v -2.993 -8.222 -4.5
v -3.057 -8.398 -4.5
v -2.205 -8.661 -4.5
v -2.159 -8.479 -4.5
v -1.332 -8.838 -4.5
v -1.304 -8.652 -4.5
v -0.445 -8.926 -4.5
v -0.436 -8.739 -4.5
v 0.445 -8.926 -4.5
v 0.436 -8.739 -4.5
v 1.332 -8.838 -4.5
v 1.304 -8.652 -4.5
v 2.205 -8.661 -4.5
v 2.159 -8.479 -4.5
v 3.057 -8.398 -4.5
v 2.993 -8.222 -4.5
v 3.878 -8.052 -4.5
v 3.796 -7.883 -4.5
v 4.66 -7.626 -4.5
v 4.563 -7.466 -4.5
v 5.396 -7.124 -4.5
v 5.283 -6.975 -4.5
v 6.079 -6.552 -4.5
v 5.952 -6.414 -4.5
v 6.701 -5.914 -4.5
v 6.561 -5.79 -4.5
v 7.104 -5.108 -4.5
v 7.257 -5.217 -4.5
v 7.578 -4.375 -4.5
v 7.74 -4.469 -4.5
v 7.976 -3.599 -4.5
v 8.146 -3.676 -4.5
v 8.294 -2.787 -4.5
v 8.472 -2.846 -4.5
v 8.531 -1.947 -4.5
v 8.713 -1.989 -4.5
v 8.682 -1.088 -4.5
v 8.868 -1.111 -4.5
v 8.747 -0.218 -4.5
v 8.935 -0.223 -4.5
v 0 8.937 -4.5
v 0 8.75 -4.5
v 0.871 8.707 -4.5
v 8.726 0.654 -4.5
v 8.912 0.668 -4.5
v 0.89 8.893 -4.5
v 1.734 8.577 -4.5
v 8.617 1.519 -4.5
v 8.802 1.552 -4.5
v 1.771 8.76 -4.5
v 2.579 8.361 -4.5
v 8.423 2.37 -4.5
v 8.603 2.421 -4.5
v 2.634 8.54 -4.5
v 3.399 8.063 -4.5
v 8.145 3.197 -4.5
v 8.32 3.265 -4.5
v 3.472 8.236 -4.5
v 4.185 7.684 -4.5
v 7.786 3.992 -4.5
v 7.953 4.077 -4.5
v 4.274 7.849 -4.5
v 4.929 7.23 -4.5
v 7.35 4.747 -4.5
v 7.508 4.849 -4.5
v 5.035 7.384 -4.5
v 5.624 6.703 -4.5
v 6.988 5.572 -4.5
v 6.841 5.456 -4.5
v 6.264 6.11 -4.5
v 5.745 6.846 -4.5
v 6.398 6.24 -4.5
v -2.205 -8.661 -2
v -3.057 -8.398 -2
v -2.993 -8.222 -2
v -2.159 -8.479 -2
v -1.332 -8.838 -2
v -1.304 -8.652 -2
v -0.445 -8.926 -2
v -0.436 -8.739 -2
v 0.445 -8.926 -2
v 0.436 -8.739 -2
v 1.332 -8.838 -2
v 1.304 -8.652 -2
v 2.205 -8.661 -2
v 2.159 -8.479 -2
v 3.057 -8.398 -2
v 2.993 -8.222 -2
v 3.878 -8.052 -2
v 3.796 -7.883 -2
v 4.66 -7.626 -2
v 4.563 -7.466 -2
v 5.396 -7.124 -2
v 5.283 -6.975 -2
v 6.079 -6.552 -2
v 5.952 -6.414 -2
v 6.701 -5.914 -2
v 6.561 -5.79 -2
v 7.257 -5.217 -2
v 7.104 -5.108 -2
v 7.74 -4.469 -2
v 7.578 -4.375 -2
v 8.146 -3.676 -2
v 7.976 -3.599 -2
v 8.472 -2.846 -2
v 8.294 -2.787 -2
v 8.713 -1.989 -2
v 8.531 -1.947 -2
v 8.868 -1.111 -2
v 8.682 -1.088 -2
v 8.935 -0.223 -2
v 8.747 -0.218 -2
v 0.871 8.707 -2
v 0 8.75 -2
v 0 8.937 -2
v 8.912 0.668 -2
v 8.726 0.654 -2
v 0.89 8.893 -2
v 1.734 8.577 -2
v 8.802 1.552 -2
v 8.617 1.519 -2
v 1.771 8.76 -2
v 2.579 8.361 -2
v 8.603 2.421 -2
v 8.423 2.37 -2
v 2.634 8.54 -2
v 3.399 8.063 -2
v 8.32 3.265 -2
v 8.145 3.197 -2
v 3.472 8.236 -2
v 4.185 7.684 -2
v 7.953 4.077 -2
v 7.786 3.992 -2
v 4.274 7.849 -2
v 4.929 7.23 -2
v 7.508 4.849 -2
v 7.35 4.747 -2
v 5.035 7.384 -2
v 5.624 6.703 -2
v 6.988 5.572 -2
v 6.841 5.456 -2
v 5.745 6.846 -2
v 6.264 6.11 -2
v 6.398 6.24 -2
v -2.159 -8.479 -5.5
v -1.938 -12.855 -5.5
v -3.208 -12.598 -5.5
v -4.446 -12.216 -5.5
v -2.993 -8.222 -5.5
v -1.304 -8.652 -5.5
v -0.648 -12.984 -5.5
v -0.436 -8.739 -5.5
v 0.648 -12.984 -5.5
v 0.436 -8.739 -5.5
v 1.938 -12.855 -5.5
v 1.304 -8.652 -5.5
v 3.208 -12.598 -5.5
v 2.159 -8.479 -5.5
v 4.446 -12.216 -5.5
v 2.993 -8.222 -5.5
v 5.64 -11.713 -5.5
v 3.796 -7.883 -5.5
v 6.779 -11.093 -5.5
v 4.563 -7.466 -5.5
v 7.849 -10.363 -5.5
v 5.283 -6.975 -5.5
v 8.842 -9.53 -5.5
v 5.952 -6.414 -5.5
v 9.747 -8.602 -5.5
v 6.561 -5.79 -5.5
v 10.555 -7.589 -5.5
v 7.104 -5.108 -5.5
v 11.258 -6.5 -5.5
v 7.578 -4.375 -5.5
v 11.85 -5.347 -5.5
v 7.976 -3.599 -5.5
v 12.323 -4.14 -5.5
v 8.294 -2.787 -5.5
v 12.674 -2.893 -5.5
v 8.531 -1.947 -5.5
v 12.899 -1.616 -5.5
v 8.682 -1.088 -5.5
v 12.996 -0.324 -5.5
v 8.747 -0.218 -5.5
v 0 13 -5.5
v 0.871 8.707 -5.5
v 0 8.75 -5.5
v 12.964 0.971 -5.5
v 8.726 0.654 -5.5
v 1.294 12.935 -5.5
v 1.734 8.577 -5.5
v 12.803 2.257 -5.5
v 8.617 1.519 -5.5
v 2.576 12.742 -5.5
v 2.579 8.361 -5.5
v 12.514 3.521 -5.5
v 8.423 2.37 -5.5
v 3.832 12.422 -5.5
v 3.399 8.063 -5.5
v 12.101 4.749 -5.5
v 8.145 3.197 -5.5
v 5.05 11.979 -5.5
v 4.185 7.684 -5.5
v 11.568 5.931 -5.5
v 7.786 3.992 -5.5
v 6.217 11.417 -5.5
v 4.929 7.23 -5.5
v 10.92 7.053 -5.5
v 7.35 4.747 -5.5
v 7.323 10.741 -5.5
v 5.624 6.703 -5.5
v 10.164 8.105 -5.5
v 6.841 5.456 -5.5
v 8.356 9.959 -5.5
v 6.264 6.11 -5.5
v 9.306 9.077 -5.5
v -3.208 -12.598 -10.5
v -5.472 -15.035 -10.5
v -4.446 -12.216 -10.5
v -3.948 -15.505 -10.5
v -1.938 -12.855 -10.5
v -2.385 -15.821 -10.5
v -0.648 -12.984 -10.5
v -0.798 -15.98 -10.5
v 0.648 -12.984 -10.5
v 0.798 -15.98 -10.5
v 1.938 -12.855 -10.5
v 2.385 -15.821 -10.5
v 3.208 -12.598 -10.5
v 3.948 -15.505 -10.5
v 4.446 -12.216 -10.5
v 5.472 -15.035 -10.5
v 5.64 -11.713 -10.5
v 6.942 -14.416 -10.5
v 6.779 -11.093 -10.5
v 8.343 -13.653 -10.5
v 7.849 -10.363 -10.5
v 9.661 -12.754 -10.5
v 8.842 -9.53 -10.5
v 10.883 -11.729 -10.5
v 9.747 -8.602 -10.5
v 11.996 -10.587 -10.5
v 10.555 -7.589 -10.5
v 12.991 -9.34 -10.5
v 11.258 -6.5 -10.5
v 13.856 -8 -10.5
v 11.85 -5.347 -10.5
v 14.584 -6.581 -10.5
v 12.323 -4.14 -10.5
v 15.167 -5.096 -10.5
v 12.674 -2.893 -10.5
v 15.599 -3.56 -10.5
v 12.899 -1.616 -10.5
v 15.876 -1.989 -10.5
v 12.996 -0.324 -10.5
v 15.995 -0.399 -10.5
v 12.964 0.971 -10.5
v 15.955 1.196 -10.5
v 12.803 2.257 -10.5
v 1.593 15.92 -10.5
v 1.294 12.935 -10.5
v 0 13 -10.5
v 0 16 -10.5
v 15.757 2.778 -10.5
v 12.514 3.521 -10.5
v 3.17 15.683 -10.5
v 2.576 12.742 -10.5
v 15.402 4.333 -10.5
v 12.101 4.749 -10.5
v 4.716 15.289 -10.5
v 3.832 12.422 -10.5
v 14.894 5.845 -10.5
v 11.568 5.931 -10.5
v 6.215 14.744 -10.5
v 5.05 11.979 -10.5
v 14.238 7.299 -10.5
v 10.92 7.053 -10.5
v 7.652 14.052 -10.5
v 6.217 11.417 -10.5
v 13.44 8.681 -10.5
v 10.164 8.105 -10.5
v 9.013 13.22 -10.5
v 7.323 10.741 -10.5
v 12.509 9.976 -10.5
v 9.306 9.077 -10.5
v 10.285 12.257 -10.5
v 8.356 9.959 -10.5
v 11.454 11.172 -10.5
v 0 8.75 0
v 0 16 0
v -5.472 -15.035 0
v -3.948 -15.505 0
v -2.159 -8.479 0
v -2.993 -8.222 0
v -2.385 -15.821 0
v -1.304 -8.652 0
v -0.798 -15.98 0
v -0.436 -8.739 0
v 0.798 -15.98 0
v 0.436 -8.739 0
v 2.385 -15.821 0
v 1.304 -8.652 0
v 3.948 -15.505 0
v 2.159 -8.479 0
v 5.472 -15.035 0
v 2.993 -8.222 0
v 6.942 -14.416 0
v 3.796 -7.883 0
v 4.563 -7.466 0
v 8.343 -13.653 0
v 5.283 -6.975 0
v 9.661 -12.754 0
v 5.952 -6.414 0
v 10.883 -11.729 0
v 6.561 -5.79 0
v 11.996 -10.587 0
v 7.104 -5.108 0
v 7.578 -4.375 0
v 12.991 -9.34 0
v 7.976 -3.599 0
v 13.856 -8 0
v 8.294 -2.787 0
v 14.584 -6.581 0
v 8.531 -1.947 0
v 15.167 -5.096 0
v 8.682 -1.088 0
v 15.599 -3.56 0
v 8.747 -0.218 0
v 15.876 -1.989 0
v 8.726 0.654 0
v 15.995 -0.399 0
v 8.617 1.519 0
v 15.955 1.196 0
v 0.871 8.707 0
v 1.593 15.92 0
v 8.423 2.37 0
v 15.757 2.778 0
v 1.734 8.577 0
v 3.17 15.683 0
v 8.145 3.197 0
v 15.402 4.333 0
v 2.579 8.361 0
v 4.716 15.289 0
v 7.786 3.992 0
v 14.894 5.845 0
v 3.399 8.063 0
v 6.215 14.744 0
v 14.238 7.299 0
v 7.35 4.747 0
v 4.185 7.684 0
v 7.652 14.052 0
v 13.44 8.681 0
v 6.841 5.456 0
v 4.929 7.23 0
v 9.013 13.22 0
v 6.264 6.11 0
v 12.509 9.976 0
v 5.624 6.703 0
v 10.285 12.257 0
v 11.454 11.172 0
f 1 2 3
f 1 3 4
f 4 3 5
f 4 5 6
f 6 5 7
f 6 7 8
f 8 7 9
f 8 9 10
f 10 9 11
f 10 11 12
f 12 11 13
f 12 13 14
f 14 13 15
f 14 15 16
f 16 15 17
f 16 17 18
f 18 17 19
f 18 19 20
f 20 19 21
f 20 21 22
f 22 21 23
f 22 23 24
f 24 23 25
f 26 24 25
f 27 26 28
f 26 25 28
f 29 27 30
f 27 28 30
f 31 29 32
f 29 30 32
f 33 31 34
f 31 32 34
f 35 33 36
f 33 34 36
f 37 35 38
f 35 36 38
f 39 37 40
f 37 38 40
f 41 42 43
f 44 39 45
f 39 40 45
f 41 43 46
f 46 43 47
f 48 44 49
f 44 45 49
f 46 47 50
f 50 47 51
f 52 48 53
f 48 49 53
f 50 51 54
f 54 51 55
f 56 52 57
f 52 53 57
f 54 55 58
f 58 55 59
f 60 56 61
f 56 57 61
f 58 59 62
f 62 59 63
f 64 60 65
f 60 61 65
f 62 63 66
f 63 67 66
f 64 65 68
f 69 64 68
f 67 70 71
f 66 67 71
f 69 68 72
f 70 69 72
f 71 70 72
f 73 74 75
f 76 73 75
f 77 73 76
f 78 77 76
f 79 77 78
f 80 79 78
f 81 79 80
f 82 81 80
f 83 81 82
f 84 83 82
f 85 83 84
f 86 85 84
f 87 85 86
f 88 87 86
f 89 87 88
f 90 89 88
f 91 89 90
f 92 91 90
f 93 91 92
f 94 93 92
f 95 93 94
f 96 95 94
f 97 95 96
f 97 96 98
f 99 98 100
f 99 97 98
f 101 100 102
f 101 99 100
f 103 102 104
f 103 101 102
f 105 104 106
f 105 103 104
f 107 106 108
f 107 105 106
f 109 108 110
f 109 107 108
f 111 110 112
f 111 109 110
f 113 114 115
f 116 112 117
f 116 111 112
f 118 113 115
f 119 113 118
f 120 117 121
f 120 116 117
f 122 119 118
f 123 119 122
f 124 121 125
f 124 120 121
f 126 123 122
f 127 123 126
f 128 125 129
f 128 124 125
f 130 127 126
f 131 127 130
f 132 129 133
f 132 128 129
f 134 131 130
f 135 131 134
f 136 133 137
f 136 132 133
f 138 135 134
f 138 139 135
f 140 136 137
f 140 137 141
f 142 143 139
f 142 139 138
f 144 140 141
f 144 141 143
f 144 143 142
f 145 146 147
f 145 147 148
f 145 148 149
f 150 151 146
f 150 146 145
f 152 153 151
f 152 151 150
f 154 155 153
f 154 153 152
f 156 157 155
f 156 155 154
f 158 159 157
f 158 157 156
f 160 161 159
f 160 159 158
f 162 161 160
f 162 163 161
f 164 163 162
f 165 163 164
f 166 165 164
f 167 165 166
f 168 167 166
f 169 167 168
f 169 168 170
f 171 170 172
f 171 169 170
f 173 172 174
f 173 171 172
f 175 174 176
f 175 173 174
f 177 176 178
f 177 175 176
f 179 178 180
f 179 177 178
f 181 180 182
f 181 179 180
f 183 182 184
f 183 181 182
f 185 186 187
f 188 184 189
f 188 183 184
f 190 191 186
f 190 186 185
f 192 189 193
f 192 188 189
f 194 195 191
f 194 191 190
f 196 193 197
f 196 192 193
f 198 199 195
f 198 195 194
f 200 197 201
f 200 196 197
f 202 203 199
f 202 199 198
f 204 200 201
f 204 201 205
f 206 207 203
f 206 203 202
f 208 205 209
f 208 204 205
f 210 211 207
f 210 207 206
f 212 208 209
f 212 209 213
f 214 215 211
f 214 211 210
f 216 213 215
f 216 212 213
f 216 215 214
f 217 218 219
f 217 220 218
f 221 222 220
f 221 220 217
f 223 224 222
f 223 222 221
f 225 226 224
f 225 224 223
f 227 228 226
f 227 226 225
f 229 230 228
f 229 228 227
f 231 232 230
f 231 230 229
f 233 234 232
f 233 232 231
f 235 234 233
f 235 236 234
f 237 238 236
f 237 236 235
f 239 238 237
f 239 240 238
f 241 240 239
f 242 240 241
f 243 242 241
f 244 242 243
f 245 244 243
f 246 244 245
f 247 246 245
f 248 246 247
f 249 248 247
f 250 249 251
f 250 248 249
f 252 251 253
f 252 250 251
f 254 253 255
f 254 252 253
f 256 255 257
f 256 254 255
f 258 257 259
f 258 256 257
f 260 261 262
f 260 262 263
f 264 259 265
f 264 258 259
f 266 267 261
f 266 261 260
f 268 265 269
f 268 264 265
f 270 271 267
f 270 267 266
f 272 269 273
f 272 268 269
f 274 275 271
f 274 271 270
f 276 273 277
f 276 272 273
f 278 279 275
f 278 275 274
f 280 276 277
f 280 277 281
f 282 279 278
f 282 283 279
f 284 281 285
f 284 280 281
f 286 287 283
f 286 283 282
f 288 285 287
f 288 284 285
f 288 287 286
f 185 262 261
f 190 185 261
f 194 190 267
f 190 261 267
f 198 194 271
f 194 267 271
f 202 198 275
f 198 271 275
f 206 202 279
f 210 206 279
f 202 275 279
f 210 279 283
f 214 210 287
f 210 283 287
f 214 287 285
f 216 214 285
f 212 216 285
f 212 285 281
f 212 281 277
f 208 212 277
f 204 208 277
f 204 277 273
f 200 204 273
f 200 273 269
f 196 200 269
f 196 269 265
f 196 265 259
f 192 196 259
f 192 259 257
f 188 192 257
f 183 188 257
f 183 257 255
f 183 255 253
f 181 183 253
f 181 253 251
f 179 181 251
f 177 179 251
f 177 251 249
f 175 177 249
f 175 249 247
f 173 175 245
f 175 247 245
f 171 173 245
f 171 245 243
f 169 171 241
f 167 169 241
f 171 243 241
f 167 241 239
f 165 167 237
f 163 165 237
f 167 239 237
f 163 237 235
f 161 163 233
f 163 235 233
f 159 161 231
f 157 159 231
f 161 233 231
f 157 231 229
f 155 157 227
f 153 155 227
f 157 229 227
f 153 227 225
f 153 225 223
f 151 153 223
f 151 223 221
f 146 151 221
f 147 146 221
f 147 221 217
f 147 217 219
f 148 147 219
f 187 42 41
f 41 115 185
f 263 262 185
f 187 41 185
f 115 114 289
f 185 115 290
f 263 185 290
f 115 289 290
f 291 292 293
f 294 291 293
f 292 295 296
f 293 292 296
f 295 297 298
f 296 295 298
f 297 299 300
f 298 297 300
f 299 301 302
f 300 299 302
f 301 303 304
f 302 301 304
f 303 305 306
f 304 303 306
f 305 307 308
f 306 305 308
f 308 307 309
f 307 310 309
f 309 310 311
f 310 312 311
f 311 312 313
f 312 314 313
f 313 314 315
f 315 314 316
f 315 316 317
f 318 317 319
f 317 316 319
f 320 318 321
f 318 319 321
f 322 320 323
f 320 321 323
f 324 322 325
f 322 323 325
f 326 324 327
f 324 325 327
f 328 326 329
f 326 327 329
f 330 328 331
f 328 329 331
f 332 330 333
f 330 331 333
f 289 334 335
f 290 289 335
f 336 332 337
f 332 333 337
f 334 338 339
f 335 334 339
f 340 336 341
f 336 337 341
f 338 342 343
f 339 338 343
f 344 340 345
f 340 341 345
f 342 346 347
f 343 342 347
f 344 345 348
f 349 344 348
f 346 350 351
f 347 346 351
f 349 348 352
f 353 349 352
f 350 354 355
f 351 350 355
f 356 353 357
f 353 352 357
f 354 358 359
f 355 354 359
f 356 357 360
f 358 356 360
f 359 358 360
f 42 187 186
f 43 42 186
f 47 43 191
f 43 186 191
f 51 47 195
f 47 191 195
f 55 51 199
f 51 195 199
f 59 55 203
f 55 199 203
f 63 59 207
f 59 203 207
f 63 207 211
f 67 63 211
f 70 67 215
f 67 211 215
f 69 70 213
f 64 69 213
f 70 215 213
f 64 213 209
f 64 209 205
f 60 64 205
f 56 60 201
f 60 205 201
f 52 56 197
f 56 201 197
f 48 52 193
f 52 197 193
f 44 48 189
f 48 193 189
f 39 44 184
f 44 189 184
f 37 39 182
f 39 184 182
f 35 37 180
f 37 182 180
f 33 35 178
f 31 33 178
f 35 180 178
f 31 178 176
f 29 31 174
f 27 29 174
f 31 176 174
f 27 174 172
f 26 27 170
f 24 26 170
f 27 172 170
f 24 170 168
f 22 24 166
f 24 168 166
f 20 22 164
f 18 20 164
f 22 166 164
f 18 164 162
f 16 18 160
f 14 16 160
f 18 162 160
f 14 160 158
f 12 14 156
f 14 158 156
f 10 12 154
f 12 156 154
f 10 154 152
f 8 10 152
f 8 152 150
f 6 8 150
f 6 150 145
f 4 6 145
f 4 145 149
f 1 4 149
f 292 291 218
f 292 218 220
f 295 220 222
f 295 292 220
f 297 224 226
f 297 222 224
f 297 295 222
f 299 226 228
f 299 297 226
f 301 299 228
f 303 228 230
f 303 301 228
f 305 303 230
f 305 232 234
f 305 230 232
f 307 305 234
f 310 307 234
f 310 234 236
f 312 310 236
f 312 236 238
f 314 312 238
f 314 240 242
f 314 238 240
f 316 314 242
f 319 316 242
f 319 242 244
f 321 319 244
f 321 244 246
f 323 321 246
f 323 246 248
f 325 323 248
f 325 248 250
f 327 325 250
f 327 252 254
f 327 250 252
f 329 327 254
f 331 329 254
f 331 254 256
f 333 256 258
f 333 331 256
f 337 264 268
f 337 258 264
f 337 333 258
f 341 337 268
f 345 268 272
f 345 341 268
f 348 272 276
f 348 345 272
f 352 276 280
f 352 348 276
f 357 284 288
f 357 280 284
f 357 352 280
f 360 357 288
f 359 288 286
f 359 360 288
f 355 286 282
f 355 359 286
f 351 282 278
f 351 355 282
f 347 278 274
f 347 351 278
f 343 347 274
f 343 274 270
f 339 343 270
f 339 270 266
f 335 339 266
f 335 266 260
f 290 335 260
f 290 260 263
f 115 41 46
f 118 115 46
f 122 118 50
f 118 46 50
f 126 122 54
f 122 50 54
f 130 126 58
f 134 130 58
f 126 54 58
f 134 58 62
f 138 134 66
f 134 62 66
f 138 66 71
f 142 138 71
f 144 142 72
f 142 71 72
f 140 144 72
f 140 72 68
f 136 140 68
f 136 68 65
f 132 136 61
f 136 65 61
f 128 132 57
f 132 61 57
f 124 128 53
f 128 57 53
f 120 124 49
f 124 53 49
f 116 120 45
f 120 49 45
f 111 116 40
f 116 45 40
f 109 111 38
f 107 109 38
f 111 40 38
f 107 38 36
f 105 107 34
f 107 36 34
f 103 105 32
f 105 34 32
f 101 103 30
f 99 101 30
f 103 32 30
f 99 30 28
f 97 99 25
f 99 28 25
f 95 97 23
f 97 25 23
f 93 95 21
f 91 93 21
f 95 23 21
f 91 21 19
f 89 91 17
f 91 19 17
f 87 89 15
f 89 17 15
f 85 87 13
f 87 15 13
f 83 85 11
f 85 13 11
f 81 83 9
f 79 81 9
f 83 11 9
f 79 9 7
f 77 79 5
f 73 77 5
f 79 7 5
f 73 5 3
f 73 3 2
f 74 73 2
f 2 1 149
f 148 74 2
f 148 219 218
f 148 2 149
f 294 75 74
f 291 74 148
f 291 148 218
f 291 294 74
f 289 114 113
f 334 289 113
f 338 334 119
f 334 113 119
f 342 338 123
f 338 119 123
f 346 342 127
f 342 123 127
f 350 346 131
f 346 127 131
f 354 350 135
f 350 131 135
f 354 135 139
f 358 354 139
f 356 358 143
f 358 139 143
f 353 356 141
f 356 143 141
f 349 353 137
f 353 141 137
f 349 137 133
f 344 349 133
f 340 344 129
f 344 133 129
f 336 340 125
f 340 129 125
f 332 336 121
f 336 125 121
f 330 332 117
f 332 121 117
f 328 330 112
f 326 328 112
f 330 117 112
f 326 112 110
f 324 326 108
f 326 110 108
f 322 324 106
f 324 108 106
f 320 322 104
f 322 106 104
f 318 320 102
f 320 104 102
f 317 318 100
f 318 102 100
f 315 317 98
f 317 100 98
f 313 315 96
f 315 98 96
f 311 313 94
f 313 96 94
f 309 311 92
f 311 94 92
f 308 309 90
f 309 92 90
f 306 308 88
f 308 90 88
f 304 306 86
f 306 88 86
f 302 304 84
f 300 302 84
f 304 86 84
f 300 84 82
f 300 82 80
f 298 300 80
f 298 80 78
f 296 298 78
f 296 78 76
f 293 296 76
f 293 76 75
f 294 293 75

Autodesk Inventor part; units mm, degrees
ref_plane "YZ Plane" through (0, 0, 0) normal (1, 0, 0) x (0, 1, 0)
ref_plane "XZ Plane" through (0, 0, 0) normal (0, 1, 0) x (-1, 0, 0)
ref_plane "XY Plane" through (0, 0, 0) normal (0, 0, 1) x (1, 0, 0)
sketch "Sketch1" plane through (0, 0, 0) normal (1, 0, 0) x (0, 1, 0)
  line L0 (0, 0) -> (8.75, 0) construction
  line L1 (8.75, 0) -> (8.75, -2)
  line L2 (8.75, -2) -> (8.9374, -2)
  line L3 (8.9374, -2) -> (8.9374, -4.5)
  line L4 (8.9374, -4.5) -> (8.75, -4.5)
  line L5 (8.75, -4.5) -> (8.75, -5.5)
  line L6 (8.75, -5.5) -> (13, -5.5)
  line L7 (13, -5.5) -> (13, -10.5)
  line L8 (13, -10.5) -> (16, -10.5)
  line L9 (16, -10.5) -> (16, 0)
  line L10 (16, 0) -> (8.75, 0)
  line L11 (0, 0) -> (0, -14.519)
  dimension "d0" = 8.75
  dimension "d1" = 2
  dimension "d2" = 2.5
  dimension "d3" = 1
  dimension "d4" = 5
  dimension "d5" = 13
  dimension "d8" = 16
revolve "Revolution1" add sketch "Sketch1" angle 200 about axis through (0, 0, 0) along (0, 0, -1)
properties part number "00_Adapter_M8_Fluorescentfilter_Cellphone"
